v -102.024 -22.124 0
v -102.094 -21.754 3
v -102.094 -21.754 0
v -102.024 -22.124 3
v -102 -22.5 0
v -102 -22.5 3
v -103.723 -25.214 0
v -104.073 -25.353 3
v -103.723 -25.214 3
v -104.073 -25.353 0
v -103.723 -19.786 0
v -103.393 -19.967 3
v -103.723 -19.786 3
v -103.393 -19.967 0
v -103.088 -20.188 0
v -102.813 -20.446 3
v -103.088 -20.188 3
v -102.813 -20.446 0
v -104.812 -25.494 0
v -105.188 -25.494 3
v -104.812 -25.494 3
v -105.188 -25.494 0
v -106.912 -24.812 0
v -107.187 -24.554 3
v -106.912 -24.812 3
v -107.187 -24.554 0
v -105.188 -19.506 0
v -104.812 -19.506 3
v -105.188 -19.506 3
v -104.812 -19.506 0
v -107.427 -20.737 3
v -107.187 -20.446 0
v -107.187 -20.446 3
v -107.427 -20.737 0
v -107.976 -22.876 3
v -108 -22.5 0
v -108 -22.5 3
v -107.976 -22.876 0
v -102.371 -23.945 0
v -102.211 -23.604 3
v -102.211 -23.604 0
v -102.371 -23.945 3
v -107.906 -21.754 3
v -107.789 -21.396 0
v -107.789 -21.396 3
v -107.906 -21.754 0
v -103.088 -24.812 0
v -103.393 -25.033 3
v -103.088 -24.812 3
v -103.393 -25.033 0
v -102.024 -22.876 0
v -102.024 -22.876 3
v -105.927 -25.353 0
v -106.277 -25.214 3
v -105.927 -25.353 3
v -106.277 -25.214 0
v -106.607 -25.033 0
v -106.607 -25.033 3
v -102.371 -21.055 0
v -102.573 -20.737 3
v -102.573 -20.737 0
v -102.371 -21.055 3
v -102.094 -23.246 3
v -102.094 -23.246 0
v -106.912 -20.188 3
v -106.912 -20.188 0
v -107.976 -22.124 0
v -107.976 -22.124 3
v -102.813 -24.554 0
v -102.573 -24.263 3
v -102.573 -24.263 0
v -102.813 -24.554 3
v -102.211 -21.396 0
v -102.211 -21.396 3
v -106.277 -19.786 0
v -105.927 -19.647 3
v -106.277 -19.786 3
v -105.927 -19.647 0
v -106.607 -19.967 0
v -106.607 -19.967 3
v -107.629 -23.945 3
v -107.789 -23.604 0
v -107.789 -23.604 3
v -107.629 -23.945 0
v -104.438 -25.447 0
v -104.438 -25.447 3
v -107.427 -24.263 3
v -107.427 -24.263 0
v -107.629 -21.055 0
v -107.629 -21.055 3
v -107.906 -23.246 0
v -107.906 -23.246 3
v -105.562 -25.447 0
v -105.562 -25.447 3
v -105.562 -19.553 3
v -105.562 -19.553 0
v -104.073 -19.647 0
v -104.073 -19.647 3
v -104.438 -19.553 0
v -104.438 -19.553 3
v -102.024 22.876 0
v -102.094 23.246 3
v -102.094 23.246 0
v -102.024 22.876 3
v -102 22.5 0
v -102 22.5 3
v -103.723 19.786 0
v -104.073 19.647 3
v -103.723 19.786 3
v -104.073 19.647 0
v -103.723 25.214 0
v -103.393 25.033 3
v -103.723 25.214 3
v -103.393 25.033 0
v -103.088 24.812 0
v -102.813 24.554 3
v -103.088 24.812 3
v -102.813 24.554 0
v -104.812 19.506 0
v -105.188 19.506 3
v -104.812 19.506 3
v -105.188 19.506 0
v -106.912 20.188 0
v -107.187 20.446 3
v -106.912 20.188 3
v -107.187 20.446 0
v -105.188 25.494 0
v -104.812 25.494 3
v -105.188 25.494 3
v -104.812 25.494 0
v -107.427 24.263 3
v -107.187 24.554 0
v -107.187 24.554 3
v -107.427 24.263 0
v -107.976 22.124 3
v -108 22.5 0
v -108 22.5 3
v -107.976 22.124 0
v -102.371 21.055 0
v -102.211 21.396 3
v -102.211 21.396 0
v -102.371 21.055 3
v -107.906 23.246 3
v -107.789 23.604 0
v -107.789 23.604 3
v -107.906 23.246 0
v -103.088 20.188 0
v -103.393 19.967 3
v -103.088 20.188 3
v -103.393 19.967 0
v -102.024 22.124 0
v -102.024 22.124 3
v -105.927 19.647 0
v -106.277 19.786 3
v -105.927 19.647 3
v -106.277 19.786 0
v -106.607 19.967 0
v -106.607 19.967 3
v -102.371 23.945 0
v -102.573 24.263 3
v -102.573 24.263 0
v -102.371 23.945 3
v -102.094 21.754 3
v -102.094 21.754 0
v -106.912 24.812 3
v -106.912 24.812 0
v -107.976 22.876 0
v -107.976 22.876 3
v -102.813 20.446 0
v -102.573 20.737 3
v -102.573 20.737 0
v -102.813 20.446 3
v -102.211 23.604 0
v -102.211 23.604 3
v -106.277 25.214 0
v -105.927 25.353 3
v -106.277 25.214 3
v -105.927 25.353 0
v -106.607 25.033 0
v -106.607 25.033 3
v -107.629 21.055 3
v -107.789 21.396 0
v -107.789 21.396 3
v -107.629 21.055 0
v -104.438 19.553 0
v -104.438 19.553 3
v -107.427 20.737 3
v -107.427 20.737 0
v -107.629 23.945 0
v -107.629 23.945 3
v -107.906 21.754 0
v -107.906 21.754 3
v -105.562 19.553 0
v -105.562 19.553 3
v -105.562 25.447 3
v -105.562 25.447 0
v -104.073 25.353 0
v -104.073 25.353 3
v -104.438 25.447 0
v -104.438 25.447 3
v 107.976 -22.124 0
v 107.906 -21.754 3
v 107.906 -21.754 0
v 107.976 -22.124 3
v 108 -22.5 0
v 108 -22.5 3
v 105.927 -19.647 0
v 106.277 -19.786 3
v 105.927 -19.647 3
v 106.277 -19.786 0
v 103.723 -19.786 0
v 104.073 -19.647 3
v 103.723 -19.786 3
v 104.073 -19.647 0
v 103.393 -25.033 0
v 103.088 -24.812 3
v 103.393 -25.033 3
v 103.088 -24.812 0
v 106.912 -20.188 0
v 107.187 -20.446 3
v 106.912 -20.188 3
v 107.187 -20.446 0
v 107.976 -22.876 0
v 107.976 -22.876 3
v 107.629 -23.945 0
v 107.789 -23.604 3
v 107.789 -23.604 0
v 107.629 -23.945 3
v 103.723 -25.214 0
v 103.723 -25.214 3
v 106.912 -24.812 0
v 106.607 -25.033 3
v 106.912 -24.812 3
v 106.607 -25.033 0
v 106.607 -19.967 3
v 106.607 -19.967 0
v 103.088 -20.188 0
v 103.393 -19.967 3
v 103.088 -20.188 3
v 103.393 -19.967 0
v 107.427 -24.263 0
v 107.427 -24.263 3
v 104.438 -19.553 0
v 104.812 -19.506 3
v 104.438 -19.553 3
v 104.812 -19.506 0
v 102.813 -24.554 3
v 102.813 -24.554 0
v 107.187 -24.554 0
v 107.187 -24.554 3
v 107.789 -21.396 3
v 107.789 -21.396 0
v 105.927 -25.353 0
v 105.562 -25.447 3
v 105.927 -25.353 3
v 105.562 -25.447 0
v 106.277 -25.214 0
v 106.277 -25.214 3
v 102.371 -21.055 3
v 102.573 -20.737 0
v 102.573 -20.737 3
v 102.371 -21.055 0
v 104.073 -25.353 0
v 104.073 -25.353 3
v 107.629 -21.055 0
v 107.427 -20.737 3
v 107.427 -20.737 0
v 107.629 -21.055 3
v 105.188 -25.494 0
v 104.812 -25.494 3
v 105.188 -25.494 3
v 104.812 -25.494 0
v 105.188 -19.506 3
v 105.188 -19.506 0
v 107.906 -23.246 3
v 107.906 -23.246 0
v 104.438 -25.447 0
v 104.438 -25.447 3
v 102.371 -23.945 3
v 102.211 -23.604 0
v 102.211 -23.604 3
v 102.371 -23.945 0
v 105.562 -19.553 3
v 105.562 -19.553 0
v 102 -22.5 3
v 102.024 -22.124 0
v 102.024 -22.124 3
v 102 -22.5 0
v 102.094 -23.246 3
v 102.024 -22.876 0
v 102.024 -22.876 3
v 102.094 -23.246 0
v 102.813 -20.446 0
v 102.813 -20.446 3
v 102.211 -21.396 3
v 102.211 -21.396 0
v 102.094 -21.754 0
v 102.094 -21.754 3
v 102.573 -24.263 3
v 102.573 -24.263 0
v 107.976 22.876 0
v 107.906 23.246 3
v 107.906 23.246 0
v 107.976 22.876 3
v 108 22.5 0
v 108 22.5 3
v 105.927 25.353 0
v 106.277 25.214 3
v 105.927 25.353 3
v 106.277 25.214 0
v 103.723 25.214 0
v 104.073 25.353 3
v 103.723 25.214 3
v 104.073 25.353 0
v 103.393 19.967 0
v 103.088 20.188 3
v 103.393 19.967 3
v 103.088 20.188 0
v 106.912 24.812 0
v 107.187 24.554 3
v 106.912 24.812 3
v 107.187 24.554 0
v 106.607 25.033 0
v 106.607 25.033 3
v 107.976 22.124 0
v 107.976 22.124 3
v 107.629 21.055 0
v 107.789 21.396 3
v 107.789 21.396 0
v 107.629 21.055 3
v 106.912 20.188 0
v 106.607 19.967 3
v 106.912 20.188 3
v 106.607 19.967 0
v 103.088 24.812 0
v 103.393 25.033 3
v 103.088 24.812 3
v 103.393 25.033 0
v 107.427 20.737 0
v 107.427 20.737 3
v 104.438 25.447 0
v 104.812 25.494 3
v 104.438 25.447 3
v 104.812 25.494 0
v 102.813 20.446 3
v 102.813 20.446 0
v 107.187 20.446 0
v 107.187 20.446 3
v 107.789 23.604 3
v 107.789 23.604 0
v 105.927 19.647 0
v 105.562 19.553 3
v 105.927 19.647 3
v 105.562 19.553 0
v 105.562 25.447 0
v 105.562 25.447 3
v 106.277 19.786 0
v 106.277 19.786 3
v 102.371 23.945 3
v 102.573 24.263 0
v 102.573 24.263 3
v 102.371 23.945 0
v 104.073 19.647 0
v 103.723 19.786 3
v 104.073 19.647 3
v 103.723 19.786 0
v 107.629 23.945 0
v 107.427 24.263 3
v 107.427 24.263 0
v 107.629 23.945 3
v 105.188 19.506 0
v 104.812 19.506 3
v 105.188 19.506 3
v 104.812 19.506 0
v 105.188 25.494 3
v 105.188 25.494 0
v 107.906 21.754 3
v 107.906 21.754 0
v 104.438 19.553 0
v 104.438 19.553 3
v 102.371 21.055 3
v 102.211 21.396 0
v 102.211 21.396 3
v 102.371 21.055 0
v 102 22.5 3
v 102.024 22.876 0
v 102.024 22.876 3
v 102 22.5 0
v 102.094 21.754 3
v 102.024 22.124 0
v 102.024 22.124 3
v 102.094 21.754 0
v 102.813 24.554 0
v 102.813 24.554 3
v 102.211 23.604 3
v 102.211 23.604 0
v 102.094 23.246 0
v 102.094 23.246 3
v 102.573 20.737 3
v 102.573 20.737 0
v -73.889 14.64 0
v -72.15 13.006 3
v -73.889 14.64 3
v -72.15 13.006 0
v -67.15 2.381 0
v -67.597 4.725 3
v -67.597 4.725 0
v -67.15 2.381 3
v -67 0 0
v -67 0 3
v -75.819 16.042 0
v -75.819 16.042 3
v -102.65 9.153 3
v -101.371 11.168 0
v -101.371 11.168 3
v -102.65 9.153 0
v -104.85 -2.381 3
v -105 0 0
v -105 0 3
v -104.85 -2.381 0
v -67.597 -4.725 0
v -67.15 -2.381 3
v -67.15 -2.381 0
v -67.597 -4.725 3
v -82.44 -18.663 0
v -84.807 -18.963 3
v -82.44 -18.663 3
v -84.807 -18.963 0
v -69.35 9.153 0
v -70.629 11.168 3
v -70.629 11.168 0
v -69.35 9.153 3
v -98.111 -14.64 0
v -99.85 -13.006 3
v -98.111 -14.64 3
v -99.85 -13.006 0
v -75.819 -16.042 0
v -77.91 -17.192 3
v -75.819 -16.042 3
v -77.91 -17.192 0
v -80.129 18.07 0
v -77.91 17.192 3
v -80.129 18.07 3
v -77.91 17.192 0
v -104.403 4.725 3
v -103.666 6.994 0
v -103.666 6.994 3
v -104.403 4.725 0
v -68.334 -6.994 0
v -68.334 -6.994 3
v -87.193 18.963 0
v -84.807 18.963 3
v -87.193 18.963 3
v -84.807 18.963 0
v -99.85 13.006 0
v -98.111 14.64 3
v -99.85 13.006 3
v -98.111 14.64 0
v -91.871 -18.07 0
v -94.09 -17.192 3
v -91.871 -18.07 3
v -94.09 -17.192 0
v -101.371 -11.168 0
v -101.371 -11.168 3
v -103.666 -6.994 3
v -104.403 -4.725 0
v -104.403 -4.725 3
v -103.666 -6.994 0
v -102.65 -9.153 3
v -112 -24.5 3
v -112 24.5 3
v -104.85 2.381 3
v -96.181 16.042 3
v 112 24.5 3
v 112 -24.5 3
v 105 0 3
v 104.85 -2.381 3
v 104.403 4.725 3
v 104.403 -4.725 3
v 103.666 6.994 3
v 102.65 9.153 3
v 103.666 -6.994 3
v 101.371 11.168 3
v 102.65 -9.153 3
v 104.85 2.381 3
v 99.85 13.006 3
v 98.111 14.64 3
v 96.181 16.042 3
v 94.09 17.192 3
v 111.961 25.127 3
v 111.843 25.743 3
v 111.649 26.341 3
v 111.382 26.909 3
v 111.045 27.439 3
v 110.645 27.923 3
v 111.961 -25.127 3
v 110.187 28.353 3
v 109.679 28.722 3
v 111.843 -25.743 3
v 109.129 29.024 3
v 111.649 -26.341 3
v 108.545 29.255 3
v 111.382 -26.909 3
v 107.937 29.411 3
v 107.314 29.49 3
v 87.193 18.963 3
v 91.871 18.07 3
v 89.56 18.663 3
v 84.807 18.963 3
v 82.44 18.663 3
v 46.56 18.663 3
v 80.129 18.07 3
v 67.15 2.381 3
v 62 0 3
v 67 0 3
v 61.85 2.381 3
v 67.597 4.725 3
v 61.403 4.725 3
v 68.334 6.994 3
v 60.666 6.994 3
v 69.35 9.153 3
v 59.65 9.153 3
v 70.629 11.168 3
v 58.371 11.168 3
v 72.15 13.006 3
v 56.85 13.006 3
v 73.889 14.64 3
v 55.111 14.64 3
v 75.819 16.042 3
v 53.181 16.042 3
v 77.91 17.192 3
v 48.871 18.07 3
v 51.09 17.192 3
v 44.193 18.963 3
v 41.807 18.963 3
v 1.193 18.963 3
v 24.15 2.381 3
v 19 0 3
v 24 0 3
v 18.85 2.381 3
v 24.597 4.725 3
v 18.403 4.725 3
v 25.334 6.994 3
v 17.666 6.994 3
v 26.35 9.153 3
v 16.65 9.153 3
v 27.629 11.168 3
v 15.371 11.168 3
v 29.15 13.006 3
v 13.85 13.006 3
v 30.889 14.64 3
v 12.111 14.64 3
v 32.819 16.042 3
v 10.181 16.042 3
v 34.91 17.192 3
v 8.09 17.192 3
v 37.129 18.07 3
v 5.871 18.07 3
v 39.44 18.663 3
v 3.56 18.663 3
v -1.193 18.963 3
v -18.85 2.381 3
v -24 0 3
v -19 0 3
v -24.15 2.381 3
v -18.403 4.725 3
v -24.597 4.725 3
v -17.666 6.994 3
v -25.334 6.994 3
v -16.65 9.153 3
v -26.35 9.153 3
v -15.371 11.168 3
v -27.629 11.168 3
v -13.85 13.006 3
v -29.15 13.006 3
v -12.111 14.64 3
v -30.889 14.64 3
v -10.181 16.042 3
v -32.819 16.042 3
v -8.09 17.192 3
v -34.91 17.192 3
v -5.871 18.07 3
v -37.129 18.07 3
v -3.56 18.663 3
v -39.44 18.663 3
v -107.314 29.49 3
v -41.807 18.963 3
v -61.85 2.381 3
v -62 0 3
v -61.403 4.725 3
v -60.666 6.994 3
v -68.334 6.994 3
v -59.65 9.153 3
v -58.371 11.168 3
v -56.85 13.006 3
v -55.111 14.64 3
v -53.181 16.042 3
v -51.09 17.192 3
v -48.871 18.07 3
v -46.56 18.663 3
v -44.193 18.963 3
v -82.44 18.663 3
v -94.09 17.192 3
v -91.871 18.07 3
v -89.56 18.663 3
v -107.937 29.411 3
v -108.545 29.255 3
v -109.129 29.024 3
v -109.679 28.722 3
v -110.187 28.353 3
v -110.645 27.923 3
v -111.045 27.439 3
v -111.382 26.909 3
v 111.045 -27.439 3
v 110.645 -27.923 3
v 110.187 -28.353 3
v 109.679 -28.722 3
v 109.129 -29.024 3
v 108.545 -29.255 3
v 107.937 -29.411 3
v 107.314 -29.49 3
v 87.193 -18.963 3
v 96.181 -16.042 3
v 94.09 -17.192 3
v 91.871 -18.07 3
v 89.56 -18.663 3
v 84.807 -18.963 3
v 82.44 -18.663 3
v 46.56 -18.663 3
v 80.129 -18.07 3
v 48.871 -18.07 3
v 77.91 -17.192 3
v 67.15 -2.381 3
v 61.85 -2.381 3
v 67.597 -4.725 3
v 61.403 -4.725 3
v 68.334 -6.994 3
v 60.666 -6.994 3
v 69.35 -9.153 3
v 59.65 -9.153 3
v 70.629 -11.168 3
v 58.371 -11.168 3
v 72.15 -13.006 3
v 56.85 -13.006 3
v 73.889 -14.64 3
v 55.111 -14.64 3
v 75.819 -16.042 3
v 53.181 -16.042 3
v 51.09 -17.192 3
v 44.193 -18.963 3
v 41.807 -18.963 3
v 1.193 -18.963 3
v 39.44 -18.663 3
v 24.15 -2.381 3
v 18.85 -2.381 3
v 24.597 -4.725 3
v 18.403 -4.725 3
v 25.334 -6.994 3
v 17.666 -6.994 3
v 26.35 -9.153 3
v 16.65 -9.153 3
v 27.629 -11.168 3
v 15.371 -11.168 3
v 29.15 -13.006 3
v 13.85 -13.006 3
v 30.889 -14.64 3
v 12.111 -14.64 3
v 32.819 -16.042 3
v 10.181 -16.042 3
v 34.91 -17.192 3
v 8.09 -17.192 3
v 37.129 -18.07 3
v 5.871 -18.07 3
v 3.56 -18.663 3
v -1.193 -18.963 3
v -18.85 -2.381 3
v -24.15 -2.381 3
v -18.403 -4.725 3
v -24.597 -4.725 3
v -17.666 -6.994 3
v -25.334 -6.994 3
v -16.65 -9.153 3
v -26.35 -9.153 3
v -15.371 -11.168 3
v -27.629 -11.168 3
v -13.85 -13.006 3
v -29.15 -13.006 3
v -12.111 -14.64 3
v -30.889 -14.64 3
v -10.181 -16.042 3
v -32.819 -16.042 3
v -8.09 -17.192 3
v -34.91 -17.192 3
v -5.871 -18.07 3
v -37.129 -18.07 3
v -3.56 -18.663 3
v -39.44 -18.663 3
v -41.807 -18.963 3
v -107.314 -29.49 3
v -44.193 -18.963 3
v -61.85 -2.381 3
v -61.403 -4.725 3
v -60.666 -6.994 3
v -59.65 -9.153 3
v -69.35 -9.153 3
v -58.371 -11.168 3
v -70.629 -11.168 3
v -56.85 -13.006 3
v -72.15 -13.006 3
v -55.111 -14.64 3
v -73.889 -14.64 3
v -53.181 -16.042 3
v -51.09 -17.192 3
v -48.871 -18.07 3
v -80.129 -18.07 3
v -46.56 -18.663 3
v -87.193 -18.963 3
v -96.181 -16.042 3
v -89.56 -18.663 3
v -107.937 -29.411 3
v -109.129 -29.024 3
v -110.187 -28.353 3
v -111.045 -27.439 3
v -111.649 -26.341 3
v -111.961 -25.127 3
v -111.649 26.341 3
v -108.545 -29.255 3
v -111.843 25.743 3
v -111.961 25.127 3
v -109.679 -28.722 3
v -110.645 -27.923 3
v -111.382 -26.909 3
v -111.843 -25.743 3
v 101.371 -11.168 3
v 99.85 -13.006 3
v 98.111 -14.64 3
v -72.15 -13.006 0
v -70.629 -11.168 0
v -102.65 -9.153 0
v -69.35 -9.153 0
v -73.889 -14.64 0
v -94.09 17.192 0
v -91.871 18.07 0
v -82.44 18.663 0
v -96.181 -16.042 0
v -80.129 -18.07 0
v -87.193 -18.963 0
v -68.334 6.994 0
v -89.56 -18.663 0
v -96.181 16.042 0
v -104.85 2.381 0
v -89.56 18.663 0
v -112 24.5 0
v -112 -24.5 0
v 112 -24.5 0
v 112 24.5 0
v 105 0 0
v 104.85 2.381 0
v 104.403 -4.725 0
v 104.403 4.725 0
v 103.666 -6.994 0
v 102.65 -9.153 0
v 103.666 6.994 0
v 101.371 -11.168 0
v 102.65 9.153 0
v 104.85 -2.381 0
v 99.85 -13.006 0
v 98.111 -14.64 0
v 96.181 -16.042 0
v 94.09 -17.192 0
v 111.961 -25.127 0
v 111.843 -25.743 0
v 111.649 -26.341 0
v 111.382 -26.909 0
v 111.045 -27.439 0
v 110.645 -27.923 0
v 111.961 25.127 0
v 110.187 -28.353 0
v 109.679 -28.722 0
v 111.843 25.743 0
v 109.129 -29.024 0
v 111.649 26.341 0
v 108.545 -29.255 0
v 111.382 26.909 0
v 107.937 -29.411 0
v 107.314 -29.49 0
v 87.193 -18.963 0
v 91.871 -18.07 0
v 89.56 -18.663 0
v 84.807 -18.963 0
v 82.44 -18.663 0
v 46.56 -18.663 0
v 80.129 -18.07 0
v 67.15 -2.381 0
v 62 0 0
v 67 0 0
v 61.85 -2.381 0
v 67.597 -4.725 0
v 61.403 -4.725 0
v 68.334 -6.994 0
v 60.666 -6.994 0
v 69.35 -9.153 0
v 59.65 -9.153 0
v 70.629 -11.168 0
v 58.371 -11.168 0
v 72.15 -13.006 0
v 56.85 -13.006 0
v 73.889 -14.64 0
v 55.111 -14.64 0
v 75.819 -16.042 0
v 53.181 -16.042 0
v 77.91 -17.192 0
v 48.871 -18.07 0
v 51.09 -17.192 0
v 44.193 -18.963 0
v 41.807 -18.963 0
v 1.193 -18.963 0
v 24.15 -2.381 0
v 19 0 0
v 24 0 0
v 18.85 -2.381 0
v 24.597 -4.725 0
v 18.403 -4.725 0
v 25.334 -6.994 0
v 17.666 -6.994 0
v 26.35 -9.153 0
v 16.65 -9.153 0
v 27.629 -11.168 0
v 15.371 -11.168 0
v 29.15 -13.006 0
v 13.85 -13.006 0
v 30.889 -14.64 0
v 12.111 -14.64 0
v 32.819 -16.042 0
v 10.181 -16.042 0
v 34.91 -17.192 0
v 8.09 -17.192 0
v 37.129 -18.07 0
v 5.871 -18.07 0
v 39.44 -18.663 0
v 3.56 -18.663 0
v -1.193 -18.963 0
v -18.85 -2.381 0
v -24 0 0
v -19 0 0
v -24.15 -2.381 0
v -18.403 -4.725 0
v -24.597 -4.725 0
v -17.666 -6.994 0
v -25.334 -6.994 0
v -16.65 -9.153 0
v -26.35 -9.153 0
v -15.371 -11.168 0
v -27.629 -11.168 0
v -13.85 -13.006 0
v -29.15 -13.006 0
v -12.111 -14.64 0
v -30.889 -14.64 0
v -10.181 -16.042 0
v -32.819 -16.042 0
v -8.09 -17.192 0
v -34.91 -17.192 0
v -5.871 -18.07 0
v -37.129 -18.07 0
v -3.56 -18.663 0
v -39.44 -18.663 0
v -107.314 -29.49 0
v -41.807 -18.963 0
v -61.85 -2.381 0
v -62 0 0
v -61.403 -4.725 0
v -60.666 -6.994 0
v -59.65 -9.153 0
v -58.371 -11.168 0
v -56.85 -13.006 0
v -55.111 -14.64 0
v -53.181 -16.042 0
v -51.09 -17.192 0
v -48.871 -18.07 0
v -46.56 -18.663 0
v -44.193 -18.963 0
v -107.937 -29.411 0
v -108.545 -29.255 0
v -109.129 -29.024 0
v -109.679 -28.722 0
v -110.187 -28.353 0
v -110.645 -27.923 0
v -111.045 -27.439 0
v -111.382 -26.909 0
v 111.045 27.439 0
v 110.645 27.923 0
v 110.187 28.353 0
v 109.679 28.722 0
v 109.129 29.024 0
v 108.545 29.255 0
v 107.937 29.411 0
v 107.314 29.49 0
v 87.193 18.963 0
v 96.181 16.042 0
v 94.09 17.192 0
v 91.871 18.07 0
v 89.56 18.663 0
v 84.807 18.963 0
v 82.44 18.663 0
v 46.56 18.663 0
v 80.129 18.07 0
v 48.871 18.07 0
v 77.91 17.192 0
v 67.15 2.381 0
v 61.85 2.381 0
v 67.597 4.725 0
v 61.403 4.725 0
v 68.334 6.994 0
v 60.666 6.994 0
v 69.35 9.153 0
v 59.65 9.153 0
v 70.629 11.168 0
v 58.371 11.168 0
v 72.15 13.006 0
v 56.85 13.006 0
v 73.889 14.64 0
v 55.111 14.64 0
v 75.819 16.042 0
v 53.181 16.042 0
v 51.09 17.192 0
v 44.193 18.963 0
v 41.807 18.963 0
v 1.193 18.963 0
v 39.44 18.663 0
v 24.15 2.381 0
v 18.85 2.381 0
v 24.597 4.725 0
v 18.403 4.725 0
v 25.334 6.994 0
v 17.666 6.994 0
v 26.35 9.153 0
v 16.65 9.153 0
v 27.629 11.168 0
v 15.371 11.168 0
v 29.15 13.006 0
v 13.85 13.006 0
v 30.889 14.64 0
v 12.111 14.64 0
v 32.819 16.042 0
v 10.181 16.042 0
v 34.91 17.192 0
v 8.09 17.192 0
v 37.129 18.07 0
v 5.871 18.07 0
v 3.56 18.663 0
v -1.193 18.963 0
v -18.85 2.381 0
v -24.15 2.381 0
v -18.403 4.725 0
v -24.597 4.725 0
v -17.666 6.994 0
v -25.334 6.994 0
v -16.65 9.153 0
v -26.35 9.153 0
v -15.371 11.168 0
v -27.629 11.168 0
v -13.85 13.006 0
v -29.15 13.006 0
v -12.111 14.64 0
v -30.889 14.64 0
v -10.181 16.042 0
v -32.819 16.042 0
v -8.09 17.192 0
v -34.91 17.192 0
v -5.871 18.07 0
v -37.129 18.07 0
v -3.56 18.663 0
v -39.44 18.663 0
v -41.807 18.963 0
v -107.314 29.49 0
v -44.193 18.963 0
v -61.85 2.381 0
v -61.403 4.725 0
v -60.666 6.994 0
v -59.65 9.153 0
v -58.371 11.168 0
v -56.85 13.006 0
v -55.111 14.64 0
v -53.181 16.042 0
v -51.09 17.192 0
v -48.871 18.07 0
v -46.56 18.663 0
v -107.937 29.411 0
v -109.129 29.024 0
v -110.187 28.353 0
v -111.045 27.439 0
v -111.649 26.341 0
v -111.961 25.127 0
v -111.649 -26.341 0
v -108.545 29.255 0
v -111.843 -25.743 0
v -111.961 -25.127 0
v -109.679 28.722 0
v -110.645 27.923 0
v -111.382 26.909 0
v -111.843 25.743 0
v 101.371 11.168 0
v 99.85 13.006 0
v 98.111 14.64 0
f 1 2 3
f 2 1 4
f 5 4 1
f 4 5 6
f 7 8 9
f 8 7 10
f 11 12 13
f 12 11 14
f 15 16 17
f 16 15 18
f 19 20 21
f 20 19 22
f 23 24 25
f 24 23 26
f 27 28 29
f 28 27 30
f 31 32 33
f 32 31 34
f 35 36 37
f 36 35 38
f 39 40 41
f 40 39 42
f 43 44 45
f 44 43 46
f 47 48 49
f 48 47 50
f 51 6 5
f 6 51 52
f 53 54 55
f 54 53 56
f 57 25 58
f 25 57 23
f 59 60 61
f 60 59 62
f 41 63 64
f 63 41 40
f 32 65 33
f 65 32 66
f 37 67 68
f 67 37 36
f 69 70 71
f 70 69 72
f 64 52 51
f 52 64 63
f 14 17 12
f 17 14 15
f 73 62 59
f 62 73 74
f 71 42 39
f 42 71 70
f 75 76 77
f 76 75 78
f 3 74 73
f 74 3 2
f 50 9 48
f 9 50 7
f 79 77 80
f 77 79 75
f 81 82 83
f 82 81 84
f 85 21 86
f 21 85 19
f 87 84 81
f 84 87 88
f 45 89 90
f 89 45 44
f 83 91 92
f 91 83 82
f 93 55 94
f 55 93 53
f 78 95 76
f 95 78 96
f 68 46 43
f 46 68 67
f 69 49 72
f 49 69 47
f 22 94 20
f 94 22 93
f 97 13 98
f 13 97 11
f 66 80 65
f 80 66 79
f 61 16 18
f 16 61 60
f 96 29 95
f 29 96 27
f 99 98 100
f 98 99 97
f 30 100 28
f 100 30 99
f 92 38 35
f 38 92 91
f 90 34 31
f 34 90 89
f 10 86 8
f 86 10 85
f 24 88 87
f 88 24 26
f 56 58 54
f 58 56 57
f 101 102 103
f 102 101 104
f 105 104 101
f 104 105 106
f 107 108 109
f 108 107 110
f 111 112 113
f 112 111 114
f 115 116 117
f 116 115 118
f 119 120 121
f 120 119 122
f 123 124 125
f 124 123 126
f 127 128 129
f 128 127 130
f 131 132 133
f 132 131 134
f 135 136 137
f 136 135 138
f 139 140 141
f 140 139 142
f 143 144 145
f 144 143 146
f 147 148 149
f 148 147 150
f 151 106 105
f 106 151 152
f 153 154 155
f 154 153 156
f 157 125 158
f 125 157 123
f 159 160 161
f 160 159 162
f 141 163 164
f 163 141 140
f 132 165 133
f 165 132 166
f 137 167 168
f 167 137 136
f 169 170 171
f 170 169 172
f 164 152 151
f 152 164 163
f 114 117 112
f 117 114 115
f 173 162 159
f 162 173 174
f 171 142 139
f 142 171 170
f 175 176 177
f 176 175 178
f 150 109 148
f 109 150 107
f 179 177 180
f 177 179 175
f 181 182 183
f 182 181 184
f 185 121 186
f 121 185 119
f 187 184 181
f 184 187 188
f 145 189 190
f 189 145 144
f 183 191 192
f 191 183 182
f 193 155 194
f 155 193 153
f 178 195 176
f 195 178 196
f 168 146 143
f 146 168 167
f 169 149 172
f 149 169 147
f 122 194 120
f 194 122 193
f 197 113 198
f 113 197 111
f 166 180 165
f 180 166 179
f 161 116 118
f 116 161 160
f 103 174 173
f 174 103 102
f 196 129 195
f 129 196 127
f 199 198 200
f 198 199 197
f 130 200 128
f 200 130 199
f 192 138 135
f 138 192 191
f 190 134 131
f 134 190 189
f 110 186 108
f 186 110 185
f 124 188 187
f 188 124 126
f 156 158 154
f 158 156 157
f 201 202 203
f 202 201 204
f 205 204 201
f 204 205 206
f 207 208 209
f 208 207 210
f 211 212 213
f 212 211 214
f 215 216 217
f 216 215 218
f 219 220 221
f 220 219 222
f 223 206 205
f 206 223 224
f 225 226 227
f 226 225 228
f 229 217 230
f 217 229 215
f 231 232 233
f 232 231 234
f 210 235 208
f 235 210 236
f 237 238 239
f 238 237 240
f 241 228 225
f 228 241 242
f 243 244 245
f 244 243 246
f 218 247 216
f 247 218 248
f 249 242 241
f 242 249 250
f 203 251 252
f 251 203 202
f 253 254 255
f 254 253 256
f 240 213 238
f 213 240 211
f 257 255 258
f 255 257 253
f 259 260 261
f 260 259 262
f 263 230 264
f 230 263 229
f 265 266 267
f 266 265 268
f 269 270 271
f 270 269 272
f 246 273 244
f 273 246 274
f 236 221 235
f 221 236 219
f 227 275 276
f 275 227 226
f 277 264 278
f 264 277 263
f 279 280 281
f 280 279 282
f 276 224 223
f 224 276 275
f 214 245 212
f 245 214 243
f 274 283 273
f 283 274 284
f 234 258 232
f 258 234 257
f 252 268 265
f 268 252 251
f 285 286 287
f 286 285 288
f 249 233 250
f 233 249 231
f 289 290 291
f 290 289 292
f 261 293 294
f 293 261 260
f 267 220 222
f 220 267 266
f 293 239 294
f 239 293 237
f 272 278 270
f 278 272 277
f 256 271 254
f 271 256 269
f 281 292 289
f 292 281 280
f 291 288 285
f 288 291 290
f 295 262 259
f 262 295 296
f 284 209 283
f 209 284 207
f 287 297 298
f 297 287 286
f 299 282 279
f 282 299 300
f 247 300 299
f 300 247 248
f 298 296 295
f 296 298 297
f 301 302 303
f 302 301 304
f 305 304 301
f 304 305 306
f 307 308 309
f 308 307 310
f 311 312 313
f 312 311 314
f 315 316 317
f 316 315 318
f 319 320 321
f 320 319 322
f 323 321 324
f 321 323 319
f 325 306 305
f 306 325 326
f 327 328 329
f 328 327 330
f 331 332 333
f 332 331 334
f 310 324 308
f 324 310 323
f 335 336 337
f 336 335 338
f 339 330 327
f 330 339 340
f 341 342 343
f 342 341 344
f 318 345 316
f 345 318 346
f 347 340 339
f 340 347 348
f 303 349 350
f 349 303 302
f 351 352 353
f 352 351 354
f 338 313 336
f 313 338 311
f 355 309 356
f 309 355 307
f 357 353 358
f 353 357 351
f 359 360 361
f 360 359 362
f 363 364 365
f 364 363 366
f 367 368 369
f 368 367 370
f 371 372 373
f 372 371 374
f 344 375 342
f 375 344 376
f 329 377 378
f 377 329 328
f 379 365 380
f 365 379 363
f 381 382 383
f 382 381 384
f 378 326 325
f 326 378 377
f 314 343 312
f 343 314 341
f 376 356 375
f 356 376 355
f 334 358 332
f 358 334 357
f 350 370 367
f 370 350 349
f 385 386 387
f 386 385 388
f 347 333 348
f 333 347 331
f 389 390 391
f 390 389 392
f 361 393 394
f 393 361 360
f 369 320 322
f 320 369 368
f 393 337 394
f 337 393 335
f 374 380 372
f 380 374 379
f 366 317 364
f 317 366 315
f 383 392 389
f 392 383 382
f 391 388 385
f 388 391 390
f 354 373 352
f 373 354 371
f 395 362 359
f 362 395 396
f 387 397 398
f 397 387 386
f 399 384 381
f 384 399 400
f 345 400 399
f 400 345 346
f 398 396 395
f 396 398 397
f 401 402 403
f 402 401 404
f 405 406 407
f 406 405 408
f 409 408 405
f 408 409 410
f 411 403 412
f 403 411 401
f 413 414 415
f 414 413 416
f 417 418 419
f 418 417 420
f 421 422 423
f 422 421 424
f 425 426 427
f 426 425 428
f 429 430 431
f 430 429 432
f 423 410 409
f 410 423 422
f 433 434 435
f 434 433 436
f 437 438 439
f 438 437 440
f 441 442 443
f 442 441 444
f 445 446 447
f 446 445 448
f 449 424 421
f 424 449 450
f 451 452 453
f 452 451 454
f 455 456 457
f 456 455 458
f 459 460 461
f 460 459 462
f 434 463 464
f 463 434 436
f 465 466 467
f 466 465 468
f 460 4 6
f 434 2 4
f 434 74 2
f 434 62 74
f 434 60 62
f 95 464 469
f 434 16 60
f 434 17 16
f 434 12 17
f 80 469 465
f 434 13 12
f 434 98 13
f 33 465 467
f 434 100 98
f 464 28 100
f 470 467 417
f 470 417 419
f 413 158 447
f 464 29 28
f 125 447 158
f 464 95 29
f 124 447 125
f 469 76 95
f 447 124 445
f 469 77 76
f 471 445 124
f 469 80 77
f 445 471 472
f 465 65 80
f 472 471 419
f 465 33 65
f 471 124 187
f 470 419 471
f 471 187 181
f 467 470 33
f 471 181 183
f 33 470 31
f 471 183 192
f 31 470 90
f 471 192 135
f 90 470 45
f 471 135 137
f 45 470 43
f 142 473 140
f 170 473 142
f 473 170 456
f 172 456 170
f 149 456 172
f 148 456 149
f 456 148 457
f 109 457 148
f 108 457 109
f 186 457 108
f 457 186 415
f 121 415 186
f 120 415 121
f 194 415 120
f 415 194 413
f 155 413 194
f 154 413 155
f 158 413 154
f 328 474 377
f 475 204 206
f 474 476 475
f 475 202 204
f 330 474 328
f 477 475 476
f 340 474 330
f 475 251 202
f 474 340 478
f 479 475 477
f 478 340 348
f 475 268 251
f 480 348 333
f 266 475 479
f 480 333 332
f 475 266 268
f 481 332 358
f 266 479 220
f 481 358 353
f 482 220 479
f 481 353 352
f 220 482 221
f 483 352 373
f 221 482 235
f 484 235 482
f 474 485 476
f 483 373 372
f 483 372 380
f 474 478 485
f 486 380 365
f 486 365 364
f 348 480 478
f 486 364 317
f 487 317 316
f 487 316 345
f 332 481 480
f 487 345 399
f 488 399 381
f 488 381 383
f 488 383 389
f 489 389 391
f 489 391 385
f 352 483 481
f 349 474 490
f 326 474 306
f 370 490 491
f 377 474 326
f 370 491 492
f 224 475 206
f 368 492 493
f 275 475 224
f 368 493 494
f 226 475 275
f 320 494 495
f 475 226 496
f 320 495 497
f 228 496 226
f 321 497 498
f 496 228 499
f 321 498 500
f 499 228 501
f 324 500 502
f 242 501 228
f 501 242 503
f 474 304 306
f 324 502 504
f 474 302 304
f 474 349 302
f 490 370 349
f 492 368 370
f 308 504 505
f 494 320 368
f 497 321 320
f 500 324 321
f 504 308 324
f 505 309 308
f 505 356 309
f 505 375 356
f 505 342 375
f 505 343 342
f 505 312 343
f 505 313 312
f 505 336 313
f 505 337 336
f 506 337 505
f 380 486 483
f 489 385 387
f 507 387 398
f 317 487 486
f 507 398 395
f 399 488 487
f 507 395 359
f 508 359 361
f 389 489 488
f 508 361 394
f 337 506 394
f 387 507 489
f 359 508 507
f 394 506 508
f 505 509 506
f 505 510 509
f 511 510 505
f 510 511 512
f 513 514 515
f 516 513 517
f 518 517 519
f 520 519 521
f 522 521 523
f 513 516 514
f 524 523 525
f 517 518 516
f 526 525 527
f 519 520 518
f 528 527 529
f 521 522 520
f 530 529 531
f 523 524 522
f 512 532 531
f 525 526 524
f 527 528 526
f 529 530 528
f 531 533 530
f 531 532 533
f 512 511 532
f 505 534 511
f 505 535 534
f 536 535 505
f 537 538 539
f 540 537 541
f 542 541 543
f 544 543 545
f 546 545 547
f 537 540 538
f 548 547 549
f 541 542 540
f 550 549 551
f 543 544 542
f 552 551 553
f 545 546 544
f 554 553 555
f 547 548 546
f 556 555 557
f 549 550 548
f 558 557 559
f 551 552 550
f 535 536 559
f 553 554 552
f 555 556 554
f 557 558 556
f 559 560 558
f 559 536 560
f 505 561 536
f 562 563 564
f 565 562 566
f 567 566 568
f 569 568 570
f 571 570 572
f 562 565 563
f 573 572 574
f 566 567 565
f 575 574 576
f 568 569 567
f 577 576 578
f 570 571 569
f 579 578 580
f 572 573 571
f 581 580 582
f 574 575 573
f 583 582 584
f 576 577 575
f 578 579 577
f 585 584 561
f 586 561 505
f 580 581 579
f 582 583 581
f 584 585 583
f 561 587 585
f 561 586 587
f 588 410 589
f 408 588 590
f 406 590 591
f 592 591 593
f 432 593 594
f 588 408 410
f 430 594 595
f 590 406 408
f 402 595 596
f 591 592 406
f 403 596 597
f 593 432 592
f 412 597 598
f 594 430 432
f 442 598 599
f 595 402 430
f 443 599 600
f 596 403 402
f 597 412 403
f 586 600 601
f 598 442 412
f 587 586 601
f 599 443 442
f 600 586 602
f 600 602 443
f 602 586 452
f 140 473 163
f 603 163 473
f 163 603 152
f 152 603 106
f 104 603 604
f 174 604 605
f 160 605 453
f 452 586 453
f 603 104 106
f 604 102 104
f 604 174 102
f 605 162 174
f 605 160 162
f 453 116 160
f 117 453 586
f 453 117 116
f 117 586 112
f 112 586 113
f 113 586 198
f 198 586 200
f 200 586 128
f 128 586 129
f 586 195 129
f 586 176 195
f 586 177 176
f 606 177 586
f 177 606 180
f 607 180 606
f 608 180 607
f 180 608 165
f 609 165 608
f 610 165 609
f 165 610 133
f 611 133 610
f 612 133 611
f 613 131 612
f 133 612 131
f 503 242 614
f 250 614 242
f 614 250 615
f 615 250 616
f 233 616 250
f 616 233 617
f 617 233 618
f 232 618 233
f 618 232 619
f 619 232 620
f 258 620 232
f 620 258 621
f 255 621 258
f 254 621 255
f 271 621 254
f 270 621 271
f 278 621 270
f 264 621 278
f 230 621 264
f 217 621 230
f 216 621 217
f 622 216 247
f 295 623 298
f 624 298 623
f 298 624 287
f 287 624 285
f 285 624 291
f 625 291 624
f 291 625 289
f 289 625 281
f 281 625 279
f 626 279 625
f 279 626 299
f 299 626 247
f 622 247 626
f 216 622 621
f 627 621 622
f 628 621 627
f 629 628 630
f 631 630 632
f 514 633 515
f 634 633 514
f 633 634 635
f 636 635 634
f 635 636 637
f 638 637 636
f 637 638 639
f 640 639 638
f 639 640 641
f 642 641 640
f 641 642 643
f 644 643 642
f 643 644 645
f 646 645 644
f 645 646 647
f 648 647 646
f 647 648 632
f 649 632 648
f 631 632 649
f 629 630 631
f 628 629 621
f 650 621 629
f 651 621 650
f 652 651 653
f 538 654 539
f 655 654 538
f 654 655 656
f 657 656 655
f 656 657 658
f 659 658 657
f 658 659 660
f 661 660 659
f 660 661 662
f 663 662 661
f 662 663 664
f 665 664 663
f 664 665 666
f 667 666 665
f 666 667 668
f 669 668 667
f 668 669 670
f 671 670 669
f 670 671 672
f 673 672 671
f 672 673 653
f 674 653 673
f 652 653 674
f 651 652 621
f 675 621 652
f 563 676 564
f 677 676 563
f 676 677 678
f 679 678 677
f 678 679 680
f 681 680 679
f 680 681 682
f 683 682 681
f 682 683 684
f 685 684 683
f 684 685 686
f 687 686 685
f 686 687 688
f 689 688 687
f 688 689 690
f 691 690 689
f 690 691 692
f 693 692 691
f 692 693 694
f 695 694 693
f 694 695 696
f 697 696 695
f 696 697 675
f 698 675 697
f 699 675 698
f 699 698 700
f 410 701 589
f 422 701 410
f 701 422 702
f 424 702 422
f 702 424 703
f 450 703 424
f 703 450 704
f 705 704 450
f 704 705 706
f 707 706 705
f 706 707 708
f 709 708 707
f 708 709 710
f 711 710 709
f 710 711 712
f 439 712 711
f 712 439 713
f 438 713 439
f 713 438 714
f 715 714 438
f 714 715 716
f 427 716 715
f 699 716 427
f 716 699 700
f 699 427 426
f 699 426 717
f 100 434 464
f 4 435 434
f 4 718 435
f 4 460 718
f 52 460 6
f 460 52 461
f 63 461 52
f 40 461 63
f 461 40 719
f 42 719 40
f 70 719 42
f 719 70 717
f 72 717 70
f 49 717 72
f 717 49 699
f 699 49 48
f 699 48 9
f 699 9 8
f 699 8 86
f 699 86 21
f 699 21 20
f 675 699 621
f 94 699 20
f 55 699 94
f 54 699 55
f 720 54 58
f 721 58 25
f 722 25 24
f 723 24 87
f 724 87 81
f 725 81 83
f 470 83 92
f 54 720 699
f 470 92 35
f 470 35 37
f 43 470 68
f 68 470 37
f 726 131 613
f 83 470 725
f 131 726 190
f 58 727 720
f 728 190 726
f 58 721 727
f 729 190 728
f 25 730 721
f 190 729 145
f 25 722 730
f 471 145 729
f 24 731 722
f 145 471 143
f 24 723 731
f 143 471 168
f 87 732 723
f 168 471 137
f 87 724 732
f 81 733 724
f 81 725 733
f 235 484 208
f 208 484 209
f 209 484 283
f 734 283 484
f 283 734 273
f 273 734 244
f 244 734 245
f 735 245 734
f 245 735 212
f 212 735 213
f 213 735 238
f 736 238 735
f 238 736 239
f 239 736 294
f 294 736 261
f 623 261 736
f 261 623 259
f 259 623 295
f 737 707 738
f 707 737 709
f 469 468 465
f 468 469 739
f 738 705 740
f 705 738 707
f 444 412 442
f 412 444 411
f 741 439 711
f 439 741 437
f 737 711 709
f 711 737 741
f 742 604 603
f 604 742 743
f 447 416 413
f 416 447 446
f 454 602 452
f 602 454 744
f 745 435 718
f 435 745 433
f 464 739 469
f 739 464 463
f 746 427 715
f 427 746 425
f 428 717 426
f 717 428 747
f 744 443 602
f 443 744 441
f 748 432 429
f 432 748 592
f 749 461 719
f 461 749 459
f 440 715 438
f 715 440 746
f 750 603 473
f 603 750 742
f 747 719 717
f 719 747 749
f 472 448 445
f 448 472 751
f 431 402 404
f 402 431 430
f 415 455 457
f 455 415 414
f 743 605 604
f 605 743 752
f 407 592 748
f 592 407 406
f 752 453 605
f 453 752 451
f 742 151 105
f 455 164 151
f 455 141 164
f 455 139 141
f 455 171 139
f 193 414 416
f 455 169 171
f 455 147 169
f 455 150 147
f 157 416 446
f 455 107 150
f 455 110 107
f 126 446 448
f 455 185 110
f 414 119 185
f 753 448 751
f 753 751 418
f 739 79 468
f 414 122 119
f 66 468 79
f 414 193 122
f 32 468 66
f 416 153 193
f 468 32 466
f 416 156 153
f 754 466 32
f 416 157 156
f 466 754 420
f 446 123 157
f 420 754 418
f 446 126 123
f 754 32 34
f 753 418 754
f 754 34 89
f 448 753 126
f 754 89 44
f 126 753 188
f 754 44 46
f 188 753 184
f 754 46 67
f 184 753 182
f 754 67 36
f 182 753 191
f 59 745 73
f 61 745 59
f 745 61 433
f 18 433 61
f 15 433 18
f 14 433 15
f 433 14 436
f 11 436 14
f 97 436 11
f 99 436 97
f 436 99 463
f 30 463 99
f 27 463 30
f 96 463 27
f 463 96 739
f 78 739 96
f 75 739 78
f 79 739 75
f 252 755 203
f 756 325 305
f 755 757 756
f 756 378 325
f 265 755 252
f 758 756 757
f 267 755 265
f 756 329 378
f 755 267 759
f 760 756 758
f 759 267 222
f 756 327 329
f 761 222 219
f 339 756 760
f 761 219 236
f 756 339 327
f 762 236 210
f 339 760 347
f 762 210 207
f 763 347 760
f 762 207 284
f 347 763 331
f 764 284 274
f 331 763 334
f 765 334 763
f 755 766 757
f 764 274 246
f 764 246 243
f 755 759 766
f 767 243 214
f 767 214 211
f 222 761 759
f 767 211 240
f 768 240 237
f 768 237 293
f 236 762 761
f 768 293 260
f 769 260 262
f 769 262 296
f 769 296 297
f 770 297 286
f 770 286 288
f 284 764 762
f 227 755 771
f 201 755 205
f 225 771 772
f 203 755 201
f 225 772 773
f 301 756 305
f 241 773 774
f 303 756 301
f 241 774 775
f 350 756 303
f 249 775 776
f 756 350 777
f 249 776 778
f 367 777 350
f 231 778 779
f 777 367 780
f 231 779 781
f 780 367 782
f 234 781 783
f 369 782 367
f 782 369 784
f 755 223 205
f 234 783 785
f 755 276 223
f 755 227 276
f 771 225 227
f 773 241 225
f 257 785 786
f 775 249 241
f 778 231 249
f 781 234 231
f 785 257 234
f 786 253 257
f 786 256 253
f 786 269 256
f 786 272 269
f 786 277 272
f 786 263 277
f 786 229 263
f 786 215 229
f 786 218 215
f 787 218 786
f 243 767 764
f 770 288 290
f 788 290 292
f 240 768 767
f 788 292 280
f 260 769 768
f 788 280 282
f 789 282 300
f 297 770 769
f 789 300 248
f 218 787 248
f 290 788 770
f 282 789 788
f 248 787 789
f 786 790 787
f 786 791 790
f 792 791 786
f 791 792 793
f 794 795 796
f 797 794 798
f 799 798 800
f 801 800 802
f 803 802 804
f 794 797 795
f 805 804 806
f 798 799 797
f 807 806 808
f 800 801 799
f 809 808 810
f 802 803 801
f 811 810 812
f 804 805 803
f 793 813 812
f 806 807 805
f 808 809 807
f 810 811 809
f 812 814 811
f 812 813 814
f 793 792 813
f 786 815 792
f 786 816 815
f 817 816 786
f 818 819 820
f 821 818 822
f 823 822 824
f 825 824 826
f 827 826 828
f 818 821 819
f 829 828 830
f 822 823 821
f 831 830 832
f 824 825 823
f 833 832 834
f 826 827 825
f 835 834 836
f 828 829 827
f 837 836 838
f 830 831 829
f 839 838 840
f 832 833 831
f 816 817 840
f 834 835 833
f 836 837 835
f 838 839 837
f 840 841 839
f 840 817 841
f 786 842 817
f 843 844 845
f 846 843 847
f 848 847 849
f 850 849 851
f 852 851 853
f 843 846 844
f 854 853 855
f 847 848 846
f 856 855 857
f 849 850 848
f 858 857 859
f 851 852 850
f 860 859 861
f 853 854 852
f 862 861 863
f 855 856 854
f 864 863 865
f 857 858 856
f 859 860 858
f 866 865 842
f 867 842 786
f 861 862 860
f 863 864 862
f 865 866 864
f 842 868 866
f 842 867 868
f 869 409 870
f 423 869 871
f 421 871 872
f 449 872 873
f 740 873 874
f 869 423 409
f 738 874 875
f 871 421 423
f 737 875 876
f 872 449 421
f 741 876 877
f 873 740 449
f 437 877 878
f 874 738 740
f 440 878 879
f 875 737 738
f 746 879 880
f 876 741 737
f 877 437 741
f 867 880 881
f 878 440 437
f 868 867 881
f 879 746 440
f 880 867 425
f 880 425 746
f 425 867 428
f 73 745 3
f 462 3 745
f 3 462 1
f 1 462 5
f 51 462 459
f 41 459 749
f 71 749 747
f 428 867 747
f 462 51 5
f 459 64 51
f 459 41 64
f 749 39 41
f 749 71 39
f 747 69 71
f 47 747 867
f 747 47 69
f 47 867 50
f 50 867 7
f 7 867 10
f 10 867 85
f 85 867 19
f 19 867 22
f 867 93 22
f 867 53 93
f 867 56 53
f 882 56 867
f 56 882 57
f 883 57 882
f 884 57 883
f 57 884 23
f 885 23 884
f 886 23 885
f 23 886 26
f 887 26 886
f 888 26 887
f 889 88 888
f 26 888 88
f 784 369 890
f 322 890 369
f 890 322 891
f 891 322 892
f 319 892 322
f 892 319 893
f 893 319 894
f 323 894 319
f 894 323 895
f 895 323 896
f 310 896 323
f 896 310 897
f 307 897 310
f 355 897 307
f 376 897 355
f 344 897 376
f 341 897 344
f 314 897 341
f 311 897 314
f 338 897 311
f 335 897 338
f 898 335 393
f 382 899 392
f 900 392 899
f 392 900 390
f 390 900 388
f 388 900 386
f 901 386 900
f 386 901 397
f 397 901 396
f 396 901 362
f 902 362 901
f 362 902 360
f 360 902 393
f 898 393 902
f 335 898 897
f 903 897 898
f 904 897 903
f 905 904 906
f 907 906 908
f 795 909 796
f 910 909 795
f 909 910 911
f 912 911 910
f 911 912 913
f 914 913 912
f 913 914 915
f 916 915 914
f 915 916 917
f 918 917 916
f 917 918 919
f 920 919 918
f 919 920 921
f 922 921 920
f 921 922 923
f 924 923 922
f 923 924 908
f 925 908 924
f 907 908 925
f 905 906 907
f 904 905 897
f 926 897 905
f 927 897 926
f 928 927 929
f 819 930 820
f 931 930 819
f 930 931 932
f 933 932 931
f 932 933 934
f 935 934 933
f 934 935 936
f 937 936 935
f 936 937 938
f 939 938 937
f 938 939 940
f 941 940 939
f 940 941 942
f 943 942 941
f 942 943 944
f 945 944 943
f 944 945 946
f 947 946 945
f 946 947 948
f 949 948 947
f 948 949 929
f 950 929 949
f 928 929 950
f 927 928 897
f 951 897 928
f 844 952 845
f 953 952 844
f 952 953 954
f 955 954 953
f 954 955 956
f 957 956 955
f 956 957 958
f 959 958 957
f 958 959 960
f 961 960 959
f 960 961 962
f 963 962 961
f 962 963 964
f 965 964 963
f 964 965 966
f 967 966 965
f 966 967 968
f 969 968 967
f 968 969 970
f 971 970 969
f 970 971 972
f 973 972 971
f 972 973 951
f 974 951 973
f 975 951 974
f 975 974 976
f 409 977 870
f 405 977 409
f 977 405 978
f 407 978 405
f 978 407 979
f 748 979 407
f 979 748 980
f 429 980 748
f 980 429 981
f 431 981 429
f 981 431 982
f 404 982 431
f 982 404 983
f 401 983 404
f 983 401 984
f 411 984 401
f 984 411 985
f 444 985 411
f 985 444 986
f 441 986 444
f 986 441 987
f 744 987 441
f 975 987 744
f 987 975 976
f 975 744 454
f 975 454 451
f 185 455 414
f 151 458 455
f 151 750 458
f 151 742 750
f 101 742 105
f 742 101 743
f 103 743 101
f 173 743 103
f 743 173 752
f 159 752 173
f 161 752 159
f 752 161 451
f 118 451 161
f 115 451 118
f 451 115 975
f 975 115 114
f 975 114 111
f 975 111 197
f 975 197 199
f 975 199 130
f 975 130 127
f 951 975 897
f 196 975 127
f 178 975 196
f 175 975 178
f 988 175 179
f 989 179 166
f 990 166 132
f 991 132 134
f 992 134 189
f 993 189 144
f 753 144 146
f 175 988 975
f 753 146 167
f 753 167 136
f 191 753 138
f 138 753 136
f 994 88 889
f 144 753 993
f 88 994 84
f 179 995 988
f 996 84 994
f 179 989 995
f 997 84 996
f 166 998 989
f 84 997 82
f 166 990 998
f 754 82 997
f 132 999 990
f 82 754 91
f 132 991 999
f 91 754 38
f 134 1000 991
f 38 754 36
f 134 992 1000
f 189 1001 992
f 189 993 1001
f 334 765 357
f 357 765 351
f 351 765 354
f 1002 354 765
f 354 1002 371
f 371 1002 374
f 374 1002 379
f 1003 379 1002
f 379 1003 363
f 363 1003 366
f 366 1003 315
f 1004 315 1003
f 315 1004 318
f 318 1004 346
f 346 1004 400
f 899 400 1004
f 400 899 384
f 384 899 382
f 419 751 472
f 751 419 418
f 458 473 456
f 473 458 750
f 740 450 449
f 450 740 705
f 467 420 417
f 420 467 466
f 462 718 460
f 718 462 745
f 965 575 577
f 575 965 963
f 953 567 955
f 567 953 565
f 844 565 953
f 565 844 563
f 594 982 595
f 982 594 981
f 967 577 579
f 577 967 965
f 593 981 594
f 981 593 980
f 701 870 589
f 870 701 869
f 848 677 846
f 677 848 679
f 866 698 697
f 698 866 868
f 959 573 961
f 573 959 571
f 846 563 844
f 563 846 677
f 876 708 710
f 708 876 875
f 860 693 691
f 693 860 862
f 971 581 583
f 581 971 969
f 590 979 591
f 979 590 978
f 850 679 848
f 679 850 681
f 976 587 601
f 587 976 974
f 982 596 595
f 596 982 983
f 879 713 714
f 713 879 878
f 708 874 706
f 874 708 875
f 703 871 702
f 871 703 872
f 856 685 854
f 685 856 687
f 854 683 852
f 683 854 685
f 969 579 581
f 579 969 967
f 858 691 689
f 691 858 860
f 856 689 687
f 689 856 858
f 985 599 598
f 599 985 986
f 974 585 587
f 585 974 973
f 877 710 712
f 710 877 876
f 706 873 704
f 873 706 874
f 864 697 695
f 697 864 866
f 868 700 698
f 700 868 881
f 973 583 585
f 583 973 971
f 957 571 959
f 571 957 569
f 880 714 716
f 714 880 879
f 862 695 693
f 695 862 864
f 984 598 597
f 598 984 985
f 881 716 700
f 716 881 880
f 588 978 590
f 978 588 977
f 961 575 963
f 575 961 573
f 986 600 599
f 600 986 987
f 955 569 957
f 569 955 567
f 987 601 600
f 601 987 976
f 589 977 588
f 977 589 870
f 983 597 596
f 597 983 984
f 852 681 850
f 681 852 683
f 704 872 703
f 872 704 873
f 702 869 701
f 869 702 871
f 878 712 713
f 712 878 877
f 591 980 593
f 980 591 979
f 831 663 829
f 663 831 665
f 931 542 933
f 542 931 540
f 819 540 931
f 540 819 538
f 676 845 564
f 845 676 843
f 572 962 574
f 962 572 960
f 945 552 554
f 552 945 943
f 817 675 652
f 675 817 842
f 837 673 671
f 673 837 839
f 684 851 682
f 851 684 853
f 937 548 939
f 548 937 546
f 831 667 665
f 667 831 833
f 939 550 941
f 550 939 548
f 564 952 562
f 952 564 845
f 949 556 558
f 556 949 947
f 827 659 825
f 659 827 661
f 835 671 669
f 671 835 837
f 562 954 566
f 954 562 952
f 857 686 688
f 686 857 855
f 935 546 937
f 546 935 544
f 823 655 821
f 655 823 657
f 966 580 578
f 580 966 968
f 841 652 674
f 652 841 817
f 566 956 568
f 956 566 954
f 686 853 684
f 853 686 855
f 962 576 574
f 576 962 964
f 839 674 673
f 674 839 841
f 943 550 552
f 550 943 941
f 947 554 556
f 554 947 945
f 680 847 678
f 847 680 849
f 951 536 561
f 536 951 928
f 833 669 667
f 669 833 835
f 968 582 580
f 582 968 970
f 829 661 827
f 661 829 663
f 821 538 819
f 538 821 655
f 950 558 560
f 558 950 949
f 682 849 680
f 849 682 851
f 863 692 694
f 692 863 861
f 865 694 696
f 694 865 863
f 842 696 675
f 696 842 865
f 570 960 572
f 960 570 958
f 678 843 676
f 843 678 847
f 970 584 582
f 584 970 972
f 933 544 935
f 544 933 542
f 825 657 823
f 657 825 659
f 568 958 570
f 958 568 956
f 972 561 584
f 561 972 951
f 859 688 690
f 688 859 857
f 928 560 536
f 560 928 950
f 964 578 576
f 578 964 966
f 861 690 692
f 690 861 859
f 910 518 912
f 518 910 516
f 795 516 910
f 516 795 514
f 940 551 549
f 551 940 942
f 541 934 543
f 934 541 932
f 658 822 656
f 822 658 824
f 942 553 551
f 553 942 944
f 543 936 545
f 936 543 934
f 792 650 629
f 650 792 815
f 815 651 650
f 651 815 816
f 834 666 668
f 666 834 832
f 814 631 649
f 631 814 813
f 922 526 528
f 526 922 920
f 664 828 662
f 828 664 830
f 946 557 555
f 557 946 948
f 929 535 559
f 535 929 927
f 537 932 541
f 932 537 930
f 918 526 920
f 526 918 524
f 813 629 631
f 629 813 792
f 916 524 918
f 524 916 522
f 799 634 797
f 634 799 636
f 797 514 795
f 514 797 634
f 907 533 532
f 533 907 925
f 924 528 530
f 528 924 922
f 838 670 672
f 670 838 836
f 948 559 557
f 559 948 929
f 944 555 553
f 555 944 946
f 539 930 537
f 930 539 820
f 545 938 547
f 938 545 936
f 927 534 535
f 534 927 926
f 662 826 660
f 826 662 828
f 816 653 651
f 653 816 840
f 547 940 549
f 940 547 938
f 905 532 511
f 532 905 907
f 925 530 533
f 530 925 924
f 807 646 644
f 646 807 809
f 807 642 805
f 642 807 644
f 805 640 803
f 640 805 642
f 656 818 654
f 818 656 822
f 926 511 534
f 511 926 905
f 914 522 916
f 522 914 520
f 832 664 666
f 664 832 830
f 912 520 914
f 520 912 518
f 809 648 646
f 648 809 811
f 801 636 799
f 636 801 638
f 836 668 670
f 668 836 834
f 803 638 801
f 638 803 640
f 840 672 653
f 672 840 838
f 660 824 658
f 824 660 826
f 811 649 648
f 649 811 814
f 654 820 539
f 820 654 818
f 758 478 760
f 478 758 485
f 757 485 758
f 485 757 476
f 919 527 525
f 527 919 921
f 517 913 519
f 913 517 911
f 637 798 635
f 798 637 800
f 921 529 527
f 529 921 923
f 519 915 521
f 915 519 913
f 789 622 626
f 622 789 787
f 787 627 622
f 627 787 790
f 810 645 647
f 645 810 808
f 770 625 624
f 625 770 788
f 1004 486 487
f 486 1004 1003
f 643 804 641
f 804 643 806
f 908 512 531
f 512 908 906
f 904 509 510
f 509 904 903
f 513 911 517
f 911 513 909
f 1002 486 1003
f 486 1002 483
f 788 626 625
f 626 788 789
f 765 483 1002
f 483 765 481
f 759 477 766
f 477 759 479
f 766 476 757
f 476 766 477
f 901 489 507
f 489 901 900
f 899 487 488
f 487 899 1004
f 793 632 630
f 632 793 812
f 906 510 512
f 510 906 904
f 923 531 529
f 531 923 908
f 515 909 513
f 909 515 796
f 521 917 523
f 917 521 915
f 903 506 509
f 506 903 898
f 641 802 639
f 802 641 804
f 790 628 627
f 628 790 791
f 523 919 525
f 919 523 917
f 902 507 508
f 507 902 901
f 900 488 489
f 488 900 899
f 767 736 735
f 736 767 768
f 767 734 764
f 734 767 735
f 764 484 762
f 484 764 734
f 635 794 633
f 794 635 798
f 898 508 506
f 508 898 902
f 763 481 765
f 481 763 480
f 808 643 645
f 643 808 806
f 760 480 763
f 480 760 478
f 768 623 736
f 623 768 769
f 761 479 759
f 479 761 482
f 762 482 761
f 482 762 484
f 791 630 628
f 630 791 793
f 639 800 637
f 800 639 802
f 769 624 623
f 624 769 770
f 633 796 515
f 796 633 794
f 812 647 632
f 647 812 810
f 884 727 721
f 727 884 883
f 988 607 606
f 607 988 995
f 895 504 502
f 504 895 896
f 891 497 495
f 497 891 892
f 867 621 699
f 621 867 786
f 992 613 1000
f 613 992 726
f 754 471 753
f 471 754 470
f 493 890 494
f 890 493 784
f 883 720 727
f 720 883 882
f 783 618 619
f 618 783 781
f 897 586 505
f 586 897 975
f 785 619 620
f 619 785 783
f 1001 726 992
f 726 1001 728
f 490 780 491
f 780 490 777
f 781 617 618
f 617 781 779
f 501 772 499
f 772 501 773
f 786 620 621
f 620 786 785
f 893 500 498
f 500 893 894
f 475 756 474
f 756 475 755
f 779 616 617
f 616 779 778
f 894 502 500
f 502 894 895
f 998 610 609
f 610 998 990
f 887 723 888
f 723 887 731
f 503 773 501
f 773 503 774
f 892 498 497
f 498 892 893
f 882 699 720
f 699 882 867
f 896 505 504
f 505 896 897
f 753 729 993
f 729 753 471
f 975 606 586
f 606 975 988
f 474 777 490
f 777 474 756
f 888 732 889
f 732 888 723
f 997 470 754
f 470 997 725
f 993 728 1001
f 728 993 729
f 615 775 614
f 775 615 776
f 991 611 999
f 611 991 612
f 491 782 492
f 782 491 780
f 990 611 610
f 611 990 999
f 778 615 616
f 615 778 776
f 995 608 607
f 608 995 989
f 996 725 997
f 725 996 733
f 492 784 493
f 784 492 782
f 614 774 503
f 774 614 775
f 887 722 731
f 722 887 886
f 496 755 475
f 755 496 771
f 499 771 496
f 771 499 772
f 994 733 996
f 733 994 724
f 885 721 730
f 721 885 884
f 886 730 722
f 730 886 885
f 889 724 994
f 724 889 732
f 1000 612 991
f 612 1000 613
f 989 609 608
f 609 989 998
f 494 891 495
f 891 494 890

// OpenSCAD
$fn = 50;


difference() {
	union() {
		hull() {
			translate(v = [-107.0000000000, 24.5000000000, 0]) {
				cylinder(h = 3, r = 5);
			}
			translate(v = [107.0000000000, 24.5000000000, 0]) {
				cylinder(h = 3, r = 5);
			}
			translate(v = [-107.0000000000, -24.5000000000, 0]) {
				cylinder(h = 3, r = 5);
			}
			translate(v = [107.0000000000, -24.5000000000, 0]) {
				cylinder(h = 3, r = 5);
			}
		}
	}
	union() {
		#translate(v = [-105.0000000000, -22.5000000000, -100.0000000000]) {
			cylinder(h = 200, r = 3.0000000000);
		}
		#translate(v = [-105.0000000000, 22.5000000000, -100.0000000000]) {
			cylinder(h = 200, r = 3.0000000000);
		}
		#translate(v = [105.0000000000, -22.5000000000, -100.0000000000]) {
			cylinder(h = 200, r = 3.0000000000);
		}
		#translate(v = [105.0000000000, 22.5000000000, -100.0000000000]) {
			cylinder(h = 200, r = 3.0000000000);
		}
		#translate(v = [-86.0000000000, 0, 0]) {
			cylinder(h = 3, r = 19.0000000000);
		}
		#translate(v = [-43.0000000000, 0, 0]) {
			cylinder(h = 3, r = 19.0000000000);
		}
		#cylinder(h = 3, r = 19.0000000000);
		#translate(v = [43.0000000000, 0, 0]) {
			cylinder(h = 3, r = 19.0000000000);
		}
		#translate(v = [86.0000000000, 0, 0]) {
			cylinder(h = 3, r = 19.0000000000);
		}
	}
}
